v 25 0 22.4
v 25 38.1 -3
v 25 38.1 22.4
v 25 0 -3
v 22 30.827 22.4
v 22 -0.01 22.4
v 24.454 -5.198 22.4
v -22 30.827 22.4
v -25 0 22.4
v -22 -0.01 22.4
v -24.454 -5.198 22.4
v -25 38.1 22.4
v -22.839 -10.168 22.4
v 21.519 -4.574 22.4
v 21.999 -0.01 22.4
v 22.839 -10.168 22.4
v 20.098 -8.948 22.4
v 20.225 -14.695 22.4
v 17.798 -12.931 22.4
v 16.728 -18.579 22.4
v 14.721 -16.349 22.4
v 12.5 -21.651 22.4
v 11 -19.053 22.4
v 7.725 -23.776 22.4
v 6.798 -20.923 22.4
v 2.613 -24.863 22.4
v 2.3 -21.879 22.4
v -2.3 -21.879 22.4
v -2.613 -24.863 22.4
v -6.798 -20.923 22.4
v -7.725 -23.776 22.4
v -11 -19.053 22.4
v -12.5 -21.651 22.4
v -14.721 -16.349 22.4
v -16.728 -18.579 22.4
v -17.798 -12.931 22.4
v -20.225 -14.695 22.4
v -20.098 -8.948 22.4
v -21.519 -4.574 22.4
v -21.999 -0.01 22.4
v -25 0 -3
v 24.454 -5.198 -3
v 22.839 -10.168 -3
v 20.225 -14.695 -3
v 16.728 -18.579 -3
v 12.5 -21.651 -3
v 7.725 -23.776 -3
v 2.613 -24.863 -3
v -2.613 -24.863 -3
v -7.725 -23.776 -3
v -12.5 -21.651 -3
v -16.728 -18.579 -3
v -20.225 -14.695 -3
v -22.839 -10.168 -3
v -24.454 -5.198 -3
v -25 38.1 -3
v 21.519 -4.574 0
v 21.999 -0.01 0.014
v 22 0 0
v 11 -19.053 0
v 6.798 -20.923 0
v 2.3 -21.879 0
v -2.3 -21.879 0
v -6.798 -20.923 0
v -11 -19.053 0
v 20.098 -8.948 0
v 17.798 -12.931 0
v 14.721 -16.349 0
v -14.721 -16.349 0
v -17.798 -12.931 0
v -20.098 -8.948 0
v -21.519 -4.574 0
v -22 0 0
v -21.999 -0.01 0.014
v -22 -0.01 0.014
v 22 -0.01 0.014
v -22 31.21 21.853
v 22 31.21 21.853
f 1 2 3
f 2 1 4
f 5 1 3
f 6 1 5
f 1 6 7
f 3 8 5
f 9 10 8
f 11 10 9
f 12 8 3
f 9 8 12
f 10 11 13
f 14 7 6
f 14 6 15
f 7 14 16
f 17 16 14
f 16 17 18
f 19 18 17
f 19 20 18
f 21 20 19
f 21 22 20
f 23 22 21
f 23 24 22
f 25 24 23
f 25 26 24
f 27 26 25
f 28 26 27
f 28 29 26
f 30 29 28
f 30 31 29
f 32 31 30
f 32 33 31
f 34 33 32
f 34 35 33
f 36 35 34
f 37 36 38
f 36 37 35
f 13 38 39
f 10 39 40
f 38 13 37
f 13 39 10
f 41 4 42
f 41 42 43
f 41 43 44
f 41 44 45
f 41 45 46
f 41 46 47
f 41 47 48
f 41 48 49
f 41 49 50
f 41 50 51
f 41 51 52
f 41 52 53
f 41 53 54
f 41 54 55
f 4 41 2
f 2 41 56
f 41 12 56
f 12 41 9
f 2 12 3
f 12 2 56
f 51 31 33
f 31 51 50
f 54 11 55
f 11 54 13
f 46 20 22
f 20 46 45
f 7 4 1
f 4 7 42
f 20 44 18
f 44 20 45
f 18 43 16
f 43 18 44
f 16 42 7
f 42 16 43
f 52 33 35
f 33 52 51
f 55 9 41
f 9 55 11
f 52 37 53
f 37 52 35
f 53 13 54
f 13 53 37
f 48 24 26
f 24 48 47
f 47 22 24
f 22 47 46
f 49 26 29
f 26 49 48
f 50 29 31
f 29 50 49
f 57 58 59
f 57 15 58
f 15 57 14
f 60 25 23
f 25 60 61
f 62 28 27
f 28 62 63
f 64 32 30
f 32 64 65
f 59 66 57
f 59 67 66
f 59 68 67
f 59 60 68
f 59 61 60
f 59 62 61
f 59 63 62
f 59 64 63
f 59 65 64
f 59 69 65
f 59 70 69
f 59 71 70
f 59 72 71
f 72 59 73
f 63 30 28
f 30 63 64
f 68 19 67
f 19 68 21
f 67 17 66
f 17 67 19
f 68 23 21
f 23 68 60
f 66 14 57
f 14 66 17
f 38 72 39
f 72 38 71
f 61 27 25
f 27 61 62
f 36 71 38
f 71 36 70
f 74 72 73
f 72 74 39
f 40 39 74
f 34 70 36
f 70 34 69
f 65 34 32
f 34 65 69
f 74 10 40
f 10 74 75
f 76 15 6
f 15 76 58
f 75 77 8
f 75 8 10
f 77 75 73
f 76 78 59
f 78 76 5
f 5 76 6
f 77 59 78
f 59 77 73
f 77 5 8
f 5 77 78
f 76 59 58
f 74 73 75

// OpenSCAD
mm=1;
cm=10*mm;
in=25.4*mm;

trough_rad = 22*mm; 
tray_depth = 16*mm;
trough_depth=1*in;
trough_length = 1.5*in;
trough_angle = 35;   
wall = 3*mm;
eps=0.01;


difference(){
    translate([0,0,-wall])
    union(){
        translate([-trough_rad-wall,0,0])
        cube([2*trough_rad+2*wall, trough_length, trough_depth]);
        cylinder(r=trough_rad+wall, h=trough_depth);
    }
    union(){
        difference(){
            cylinder(r=trough_rad,h=trough_depth);
            translate([-2*trough_rad,0,0])
            cube(4*trough_rad);
        }
        intersection(){
            translate([-2*trough_rad,-eps,0])
            cube(4*trough_rad);
            translate([-trough_rad,0,0])
            rotate([trough_angle,0,0])
            cube([2*trough_rad, trough_length, trough_depth]);
        }
    }
    
}
